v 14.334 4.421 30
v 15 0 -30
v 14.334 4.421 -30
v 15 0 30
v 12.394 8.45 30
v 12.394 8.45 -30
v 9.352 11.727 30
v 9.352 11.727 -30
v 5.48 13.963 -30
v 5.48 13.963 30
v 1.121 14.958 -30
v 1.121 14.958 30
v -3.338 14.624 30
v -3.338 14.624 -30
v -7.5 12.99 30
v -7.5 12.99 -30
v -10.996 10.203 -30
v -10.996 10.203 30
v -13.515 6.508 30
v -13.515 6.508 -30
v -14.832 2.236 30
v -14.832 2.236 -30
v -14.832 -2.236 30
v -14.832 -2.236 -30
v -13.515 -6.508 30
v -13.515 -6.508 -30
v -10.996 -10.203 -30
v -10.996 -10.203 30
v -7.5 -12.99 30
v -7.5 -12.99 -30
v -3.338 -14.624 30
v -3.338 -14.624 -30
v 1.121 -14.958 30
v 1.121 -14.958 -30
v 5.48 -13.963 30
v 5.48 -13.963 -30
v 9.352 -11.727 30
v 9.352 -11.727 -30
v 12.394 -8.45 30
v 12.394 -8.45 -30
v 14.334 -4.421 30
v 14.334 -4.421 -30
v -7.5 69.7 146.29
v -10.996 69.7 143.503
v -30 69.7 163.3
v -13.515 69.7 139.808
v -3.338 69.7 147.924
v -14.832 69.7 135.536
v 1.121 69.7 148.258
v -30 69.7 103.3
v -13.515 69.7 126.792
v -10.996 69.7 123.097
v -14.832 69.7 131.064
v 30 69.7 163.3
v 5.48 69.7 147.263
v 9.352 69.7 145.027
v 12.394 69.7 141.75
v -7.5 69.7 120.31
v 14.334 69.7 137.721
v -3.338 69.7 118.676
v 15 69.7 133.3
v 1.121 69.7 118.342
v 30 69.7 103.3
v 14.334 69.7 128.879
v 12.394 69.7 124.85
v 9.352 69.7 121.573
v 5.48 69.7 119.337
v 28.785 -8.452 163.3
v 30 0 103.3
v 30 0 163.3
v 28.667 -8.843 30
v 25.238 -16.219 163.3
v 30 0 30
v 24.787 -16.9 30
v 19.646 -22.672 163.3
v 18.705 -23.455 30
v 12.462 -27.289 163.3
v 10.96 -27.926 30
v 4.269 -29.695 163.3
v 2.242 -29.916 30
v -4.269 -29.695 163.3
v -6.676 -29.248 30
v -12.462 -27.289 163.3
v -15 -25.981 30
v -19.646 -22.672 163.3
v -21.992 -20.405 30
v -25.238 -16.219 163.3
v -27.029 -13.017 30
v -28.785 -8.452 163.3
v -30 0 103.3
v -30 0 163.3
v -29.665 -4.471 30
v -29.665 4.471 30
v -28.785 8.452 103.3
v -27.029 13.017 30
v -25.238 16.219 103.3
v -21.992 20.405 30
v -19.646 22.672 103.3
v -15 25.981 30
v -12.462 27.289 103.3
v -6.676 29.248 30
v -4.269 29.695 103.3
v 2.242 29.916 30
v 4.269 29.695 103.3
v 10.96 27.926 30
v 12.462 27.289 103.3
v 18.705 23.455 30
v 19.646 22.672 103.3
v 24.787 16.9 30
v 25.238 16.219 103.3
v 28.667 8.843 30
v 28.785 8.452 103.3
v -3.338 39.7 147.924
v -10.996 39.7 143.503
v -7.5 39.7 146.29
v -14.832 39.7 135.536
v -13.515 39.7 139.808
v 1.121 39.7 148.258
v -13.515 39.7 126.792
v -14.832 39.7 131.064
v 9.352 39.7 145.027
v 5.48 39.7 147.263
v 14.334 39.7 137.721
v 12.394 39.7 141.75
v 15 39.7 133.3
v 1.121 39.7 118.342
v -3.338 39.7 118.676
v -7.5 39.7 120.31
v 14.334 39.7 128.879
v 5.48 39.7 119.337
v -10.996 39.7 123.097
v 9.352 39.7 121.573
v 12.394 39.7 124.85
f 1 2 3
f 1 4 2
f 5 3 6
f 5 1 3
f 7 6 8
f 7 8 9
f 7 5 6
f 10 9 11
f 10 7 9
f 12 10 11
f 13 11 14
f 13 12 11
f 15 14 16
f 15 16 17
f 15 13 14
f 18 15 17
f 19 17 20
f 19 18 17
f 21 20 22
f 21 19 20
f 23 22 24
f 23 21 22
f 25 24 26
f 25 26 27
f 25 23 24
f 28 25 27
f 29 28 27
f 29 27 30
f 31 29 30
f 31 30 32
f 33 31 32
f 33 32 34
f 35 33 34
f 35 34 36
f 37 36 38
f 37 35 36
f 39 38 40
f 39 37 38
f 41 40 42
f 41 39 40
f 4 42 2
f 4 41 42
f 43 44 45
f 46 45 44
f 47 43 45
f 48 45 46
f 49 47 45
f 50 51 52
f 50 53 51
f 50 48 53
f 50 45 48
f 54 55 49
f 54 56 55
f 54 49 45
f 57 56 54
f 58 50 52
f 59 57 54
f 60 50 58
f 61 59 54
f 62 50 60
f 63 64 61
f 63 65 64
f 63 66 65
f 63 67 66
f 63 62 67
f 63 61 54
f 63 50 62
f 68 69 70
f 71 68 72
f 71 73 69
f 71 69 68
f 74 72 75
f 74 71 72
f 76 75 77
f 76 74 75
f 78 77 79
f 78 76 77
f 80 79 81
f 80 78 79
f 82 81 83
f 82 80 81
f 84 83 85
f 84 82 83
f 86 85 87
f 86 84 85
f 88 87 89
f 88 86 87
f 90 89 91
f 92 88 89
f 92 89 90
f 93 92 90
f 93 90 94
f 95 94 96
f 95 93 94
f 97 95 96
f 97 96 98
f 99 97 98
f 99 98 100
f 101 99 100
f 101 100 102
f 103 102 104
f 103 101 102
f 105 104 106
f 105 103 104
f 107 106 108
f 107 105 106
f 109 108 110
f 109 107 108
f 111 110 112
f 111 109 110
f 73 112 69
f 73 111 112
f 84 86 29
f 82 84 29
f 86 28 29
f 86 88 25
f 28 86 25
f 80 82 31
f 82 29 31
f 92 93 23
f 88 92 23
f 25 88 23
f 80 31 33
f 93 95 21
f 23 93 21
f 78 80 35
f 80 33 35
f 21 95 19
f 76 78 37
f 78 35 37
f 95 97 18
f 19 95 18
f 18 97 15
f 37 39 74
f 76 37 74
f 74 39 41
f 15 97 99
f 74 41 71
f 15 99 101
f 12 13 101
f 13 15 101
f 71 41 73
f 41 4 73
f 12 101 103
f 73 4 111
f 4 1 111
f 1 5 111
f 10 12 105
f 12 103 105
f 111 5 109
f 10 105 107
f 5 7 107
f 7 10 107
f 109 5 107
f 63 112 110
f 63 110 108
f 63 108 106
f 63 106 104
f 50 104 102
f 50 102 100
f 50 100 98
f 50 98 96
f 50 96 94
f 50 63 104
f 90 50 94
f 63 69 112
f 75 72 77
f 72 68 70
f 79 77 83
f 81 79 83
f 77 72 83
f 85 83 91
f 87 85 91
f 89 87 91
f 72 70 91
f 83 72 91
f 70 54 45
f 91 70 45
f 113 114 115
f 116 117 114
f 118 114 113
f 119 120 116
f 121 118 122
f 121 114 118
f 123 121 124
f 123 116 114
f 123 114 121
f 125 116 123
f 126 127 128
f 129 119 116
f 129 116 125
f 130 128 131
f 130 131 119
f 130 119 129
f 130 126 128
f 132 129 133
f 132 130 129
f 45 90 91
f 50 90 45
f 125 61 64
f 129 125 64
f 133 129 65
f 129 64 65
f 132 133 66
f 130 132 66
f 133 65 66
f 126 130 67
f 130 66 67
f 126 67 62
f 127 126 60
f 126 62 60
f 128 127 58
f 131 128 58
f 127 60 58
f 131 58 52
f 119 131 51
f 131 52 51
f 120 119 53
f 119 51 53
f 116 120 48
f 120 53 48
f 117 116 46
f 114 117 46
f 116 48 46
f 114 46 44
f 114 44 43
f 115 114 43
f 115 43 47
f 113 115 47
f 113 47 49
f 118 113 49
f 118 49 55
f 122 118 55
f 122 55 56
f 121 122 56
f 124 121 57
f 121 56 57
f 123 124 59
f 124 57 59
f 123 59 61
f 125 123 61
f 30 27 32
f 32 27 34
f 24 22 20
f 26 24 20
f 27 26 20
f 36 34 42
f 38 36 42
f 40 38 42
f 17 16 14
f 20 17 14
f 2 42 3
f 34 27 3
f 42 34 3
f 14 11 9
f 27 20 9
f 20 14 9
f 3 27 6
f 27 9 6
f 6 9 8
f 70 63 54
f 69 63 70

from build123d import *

# Parameters (mm, degrees)
SKETCH1_LINK4_R     = 15
BOSS_EXTRUDE1_DEPTH = 30
SKETCH2_LINK4_R     = 30
BOSS_EXTRUDE2_DEPTH = 73.3
BOSS_EXTRUDE3_DEPTH = 60
SKETCH4_LINK4_R     = 15
CUT_EXTRUDE1_DEPTH  = 30


with BuildPart() as part:
    # sketch1_link4 → Boss-Extrude1 (new body, symmetric)
    with BuildSketch(Plane.XY):
        Circle(SKETCH1_LINK4_R)
    extrude(amount=BOSS_EXTRUDE1_DEPTH, both=True)

    # sketch2_link4 → Boss-Extrude2 (add)
    with BuildSketch(Plane.XY.offset(30)):
        Circle(SKETCH2_LINK4_R)
    extrude(amount=BOSS_EXTRUDE2_DEPTH)

    # sketch3_link4 → Boss-Extrude3 (add)
    with BuildSketch(Plane.XY.offset(103.3)):
        with BuildLine():
            Line((-30, 0), (-30, 69.7))
            Line((-30, 69.7), (30, 69.7))
            Line((30, 69.7), (30, 0))
            ThreePointArc((30, 0), (0, -30), (-30, 0))
        make_face()
    extrude(amount=BOSS_EXTRUDE3_DEPTH)

    # sketch4_link4 → Cut-Extrude1 (cut)
    with BuildSketch(Plane(origin=(0, 69.7, 0), x_dir=(1, 0, 0), z_dir=(0, 1, 0))):
        with Locations((0, -133.3)):
            Circle(SKETCH4_LINK4_R)
    extrude(amount=-CUT_EXTRUDE1_DEPTH, mode=Mode.SUBTRACT)


solid = part.part
